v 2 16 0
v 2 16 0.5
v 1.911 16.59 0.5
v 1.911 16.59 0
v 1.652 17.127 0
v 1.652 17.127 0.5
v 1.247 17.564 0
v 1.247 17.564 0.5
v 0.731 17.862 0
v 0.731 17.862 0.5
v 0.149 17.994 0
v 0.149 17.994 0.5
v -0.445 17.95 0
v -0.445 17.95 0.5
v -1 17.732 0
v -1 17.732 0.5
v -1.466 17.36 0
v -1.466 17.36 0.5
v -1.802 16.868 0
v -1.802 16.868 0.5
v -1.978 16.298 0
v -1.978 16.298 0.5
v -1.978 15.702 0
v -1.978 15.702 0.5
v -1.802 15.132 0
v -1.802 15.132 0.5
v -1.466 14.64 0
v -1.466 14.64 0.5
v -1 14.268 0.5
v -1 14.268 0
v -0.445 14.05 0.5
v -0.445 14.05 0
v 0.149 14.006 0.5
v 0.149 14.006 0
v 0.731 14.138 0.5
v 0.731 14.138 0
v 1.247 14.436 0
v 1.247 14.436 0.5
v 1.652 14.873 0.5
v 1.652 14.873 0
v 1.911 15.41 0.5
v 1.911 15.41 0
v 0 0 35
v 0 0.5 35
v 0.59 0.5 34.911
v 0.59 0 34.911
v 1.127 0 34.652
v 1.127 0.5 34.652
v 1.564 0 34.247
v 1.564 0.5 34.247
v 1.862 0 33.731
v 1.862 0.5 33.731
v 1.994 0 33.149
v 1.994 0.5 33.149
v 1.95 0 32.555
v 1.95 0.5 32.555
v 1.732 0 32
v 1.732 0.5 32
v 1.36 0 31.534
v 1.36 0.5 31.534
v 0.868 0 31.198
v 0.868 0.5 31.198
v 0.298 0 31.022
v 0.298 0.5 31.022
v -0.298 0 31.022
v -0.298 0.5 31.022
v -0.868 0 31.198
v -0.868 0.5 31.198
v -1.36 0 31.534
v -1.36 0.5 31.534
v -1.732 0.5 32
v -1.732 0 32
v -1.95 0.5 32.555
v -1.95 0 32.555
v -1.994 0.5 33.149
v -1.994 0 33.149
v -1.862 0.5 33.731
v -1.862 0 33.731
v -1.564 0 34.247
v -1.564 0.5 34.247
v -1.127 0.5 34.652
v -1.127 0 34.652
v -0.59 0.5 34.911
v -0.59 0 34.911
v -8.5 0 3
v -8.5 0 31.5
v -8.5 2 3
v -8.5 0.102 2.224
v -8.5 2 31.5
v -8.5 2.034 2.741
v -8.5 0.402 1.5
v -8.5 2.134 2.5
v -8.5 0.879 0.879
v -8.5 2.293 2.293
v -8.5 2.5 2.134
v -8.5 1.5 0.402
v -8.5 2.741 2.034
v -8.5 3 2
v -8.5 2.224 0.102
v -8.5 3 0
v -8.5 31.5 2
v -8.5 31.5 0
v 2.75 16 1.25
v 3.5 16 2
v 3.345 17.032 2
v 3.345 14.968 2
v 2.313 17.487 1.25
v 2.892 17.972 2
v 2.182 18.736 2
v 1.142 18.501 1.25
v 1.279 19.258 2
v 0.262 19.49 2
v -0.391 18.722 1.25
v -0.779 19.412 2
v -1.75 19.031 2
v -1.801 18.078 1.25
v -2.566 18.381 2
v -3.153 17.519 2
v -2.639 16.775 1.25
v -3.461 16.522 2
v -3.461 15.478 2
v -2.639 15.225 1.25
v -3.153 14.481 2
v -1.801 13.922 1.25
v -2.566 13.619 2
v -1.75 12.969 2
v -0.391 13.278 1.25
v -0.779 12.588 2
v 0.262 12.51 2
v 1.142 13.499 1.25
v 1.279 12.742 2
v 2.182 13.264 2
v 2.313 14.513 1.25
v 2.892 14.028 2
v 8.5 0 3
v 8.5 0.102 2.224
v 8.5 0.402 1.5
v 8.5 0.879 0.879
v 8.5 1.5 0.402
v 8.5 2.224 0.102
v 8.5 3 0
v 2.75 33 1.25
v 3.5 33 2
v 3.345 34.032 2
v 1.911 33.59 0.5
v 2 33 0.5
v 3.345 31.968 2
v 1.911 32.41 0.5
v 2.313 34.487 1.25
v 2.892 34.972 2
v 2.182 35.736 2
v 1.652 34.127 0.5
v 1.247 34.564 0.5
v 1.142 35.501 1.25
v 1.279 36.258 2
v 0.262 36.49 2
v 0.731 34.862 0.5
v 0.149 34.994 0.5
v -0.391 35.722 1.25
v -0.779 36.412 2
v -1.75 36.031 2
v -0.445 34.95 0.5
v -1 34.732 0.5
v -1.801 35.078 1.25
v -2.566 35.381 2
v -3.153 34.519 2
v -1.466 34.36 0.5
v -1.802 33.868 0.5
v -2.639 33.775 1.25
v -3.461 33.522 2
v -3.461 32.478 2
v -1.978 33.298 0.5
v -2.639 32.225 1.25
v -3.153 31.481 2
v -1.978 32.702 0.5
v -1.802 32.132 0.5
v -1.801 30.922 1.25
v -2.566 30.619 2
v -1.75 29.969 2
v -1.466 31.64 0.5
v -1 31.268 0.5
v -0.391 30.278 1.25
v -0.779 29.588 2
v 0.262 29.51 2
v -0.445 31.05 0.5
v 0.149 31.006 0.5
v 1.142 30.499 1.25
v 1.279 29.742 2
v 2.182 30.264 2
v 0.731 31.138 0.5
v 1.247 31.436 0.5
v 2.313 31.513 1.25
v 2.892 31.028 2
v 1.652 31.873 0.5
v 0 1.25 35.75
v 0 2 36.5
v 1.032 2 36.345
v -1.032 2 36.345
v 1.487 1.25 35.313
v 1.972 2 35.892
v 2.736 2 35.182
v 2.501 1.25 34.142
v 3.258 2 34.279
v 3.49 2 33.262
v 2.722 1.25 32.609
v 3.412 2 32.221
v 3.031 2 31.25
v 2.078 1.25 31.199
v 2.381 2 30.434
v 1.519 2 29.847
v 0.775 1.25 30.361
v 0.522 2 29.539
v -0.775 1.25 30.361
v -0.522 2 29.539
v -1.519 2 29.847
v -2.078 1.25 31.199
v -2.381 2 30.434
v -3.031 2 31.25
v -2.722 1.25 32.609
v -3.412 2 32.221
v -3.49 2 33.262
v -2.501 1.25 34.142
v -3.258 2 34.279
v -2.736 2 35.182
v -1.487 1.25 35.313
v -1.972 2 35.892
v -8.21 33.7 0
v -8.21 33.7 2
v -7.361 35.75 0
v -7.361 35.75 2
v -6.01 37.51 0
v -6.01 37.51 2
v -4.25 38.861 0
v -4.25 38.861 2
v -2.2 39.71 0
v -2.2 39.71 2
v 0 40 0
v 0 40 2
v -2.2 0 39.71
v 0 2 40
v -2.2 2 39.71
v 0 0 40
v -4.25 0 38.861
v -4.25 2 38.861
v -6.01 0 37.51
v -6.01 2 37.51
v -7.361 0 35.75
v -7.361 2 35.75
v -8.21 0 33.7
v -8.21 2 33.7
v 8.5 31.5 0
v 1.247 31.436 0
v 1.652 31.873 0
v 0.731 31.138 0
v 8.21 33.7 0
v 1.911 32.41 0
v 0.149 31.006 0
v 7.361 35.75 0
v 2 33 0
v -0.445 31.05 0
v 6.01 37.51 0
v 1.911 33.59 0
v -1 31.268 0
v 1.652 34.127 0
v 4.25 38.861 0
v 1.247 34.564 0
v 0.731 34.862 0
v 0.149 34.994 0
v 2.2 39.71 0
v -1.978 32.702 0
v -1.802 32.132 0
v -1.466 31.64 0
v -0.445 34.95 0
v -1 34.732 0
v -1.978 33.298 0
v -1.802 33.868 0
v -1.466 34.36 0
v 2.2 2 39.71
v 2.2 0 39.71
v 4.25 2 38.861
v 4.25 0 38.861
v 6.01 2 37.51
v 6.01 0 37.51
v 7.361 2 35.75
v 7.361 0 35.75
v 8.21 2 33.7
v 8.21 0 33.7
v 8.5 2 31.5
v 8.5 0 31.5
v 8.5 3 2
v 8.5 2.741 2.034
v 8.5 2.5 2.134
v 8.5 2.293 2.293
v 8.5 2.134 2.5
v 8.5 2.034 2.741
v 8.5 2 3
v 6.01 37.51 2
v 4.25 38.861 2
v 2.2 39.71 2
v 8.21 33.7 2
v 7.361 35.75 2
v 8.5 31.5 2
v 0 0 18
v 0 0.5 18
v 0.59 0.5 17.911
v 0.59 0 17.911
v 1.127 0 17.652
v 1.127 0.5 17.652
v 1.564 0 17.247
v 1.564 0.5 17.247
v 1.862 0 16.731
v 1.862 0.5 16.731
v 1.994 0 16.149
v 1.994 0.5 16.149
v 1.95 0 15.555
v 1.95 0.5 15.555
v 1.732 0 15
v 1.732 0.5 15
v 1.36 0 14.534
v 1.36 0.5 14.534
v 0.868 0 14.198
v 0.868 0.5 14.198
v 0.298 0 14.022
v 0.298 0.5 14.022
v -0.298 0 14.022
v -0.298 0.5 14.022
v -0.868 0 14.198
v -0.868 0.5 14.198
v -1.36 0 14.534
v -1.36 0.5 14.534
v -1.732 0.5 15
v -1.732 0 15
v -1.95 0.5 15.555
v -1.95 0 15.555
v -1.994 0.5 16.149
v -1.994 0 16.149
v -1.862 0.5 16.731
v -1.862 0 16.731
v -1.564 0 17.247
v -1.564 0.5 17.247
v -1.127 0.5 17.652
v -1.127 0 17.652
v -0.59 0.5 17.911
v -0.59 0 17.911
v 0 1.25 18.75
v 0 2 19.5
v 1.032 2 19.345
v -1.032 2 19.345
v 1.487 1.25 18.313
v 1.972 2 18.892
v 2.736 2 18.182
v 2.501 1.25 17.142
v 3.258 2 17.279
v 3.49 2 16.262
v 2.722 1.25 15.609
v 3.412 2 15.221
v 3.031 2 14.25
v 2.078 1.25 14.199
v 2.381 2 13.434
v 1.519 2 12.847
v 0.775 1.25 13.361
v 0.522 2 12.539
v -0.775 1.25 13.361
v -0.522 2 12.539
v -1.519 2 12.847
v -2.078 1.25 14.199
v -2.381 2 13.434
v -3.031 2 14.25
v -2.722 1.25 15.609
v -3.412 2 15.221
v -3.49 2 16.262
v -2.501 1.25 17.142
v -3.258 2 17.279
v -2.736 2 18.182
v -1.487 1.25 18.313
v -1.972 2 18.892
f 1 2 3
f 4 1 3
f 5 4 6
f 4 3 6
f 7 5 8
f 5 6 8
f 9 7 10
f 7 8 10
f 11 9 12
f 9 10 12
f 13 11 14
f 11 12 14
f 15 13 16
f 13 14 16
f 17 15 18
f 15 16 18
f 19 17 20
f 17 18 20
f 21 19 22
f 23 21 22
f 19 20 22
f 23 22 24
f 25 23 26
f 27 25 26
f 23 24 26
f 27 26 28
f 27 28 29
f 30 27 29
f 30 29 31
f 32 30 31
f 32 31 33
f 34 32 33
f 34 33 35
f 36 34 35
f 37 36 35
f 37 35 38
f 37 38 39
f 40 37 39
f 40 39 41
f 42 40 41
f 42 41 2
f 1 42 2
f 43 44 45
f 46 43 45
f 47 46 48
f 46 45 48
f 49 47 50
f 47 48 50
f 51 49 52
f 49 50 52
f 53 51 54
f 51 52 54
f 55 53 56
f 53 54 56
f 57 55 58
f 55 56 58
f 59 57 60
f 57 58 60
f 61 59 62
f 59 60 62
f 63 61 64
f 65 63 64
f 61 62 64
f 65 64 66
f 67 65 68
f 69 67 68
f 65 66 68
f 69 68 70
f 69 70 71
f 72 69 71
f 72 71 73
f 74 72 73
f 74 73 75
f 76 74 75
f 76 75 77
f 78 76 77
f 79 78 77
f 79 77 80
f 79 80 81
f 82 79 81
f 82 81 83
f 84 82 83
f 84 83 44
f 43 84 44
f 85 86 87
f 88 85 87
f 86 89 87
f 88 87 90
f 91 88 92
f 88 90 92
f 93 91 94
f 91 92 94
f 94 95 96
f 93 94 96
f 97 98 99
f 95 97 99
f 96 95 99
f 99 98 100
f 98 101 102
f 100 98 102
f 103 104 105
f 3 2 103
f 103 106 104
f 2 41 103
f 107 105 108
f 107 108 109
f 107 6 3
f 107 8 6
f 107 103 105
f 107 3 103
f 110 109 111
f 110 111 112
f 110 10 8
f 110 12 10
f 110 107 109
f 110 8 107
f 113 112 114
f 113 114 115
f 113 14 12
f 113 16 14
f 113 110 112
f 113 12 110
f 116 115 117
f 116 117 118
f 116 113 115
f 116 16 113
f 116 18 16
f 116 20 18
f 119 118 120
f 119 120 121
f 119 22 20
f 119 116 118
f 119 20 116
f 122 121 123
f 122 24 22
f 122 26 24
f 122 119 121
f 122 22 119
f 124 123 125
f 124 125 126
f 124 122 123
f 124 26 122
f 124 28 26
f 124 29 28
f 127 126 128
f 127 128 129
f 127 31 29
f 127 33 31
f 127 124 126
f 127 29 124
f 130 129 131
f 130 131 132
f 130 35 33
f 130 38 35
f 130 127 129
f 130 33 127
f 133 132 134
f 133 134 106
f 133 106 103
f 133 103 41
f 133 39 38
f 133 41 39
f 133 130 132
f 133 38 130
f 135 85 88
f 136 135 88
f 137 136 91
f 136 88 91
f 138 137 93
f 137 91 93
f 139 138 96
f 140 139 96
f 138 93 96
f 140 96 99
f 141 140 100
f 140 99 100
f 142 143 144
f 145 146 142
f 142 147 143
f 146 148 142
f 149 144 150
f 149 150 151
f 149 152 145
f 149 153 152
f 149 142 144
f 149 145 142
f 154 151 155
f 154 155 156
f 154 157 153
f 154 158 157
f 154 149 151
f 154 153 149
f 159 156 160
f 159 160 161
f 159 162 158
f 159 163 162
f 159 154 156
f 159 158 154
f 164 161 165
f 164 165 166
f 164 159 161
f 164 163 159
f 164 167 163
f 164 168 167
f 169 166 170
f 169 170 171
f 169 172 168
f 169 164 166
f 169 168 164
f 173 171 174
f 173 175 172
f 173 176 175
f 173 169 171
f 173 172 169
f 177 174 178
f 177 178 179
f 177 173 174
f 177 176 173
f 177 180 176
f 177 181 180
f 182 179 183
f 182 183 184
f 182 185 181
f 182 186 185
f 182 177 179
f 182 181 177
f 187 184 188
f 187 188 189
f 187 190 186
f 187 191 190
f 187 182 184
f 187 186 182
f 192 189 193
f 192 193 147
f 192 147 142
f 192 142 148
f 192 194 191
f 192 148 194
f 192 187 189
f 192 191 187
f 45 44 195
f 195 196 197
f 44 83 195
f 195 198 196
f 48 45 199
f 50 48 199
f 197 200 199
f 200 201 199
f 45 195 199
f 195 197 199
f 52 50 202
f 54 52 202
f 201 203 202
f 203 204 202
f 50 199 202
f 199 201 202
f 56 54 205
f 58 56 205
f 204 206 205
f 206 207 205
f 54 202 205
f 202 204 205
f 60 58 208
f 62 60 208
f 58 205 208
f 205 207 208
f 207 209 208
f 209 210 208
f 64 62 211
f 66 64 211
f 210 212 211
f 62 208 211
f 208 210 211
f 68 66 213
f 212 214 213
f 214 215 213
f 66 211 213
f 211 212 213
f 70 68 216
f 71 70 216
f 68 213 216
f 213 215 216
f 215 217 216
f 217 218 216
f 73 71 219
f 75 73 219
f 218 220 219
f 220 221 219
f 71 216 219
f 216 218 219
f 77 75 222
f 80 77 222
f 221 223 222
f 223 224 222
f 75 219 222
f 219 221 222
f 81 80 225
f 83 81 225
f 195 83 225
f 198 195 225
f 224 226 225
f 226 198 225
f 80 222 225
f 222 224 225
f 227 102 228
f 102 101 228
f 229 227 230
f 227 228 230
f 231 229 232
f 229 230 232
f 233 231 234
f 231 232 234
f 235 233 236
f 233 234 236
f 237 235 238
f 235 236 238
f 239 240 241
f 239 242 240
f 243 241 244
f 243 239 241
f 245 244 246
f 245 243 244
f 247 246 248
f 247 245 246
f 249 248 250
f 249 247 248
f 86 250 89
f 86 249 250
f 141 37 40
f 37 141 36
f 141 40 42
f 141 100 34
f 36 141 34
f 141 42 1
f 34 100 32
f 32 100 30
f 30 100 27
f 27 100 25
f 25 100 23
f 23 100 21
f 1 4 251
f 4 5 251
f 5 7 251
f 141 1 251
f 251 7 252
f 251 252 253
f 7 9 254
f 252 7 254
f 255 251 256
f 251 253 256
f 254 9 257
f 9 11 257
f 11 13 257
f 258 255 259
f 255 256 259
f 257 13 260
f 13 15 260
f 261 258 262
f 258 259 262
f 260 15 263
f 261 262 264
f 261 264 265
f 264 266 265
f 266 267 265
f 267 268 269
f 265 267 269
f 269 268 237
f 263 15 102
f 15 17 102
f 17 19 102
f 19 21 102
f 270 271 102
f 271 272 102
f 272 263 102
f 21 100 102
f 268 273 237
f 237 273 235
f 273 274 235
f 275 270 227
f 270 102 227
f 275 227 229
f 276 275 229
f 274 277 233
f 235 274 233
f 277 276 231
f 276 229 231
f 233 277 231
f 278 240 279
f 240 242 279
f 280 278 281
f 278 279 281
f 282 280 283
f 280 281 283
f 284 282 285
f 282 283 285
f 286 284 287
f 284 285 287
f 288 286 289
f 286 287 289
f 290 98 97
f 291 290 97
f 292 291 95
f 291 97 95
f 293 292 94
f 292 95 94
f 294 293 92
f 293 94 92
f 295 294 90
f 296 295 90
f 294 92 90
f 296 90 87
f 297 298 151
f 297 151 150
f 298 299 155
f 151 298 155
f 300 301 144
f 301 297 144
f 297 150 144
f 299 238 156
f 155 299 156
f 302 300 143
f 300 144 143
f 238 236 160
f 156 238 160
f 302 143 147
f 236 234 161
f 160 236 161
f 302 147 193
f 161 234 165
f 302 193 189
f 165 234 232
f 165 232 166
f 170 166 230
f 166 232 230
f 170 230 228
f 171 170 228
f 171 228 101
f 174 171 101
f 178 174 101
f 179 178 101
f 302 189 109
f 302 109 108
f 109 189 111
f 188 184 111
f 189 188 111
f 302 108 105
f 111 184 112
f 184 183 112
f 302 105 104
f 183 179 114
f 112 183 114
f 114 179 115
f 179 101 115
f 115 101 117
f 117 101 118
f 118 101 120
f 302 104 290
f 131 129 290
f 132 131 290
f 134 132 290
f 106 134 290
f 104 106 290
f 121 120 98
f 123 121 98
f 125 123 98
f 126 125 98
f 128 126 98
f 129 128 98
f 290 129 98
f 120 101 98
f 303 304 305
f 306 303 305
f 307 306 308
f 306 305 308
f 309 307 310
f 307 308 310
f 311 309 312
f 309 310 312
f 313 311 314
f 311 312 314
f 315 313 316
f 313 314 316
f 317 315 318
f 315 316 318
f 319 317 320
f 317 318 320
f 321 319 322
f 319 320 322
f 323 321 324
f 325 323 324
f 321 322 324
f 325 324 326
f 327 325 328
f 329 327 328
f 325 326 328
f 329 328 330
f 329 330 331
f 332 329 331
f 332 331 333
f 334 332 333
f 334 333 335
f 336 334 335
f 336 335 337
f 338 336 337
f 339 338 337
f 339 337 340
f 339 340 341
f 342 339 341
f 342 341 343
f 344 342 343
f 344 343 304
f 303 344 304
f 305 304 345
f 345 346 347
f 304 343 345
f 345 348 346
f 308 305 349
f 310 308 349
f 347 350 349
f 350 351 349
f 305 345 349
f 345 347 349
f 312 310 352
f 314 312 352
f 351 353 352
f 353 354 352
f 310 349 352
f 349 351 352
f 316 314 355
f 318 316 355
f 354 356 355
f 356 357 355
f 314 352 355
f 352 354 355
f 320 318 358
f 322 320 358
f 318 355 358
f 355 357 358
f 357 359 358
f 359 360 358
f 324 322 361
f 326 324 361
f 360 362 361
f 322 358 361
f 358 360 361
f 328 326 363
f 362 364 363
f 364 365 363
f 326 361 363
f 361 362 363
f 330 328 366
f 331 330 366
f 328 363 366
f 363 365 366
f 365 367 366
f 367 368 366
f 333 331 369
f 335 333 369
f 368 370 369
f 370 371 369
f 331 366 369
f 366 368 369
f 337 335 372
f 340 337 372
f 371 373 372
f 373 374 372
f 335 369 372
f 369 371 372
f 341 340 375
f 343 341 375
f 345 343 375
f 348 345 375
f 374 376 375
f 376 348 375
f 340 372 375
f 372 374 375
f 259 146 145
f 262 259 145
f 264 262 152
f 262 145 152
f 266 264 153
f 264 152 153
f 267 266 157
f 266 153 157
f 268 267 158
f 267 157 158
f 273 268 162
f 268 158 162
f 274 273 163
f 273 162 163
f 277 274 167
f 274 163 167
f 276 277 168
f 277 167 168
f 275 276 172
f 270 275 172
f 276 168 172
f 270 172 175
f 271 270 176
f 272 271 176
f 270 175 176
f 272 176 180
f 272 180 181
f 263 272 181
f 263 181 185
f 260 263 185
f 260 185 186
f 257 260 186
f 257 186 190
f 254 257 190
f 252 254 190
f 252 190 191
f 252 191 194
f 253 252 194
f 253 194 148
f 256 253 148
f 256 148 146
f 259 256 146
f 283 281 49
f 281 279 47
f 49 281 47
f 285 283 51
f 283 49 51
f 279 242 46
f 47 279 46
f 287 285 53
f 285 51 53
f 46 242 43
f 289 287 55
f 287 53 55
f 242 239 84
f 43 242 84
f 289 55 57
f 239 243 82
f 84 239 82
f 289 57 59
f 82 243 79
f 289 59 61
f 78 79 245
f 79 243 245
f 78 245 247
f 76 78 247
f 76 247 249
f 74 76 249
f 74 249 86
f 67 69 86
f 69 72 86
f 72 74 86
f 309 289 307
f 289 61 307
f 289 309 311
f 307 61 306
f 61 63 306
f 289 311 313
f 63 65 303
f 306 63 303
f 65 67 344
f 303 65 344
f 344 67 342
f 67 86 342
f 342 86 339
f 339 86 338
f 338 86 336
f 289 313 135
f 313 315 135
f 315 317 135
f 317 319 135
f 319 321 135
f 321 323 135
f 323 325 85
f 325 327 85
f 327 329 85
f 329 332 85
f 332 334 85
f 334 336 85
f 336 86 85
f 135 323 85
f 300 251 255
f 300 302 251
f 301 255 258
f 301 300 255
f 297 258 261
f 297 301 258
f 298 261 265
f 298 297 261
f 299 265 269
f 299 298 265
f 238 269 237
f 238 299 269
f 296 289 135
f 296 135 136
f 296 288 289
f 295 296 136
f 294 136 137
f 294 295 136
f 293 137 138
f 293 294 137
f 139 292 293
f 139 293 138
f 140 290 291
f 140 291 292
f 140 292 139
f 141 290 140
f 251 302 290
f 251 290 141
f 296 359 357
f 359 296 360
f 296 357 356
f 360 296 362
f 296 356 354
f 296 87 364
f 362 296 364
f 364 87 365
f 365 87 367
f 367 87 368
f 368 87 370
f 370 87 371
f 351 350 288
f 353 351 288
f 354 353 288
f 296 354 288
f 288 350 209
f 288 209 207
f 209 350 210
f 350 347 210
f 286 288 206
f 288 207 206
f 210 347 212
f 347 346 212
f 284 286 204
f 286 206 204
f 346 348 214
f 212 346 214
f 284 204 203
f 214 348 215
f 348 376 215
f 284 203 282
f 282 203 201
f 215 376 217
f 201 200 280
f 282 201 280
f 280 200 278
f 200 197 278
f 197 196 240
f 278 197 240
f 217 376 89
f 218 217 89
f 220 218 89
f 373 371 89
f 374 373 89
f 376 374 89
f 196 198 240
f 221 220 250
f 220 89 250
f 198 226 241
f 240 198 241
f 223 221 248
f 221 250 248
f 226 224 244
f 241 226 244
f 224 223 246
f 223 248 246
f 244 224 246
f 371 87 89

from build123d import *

# Parameters (mm, degrees)
EXTRUDE_1_DEPTH      = 8.5
EXTRUDE_1_DEPTH_BACK = 8.5
SKETCH_3_R           = 2
CUT_EXTRUDE_2_DEPTH  = 15.5
SKETCH_4_R           = 2
CUT_EXTRUDE_3_DEPTH  = 15.5
FILLET_1_R           = 8.5
CHAMFER_1_SIZE       = 1.5


with BuildPart() as part:
    # 草图1 → 凸台-拉伸1 (new, two sides: drawn at the far end of the back side and taken through both)
    with BuildSketch(Plane(origin=(0, 0, 0), x_dir=(0, 0, -1), z_dir=(1, 0, 0)).offset(-EXTRUDE_1_DEPTH_BACK)):
        with BuildLine():
            Line((-40, 0), (-3, 0))
            ThreePointArc((-3, 0), (-0.878679656, 0.878679656), (0, 3))
            Line((0, 3), (0, 40))
            Line((0, 40), (-2, 40))
            Line((-2, 40), (-2, 3))
            ThreePointArc((-2, 3), (-2.292893219, 2.292893219), (-3, 2))
            Line((-3, 2), (-40, 2))
            Line((-40, 2), (-40, 0))
        make_face()
    extrude(amount=EXTRUDE_1_DEPTH + EXTRUDE_1_DEPTH_BACK)

    # 草图3 → 切除-拉伸2 (cut)
    with BuildSketch(Plane(origin=(0, 2, 0), x_dir=(1, 0, 0), z_dir=(0, 1, 0))):
        with Locations(Location((0, -33, 0), (0, 0, 270))):
            Circle(SKETCH_3_R)
        with Locations(Location((0, -16, 0), (0, 0, 270))):
            Circle(SKETCH_3_R)
    extrude(amount=-CUT_EXTRUDE_2_DEPTH, mode=Mode.SUBTRACT)

    # 草图4 → 切除-拉伸3 (cut)
    with BuildSketch(Plane.XY.offset(2)):
        with Locations((0, 33)):
            Circle(SKETCH_4_R)
        with Locations((0, 16)):
            Circle(SKETCH_4_R)
    extrude(amount=-CUT_EXTRUDE_3_DEPTH, mode=Mode.SUBTRACT)

    # 圆角1
    fillet_1_edges = [part.edges().sort_by_distance(p)[0] for p in [
        (8.5, 40, 1),
        (-8.5, 40, 1),
        (8.5, 1, 40),
        (-8.5, 1, 40),
    ]]
    fillet(fillet_1_edges, radius=FILLET_1_R - 0.0001)  # a hair under: the kernel refuses the full size

    # 倒角1
    chamfer_1_edges = [part.edges().sort_by_distance(p)[0] for p in [
        (0, 2, 31),
        (0, 2, 14),
        (-2, 33, 2),
        (-2, 16, 2),
    ]]
    chamfer(chamfer_1_edges, length=CHAMFER_1_SIZE)


solid = part.part
